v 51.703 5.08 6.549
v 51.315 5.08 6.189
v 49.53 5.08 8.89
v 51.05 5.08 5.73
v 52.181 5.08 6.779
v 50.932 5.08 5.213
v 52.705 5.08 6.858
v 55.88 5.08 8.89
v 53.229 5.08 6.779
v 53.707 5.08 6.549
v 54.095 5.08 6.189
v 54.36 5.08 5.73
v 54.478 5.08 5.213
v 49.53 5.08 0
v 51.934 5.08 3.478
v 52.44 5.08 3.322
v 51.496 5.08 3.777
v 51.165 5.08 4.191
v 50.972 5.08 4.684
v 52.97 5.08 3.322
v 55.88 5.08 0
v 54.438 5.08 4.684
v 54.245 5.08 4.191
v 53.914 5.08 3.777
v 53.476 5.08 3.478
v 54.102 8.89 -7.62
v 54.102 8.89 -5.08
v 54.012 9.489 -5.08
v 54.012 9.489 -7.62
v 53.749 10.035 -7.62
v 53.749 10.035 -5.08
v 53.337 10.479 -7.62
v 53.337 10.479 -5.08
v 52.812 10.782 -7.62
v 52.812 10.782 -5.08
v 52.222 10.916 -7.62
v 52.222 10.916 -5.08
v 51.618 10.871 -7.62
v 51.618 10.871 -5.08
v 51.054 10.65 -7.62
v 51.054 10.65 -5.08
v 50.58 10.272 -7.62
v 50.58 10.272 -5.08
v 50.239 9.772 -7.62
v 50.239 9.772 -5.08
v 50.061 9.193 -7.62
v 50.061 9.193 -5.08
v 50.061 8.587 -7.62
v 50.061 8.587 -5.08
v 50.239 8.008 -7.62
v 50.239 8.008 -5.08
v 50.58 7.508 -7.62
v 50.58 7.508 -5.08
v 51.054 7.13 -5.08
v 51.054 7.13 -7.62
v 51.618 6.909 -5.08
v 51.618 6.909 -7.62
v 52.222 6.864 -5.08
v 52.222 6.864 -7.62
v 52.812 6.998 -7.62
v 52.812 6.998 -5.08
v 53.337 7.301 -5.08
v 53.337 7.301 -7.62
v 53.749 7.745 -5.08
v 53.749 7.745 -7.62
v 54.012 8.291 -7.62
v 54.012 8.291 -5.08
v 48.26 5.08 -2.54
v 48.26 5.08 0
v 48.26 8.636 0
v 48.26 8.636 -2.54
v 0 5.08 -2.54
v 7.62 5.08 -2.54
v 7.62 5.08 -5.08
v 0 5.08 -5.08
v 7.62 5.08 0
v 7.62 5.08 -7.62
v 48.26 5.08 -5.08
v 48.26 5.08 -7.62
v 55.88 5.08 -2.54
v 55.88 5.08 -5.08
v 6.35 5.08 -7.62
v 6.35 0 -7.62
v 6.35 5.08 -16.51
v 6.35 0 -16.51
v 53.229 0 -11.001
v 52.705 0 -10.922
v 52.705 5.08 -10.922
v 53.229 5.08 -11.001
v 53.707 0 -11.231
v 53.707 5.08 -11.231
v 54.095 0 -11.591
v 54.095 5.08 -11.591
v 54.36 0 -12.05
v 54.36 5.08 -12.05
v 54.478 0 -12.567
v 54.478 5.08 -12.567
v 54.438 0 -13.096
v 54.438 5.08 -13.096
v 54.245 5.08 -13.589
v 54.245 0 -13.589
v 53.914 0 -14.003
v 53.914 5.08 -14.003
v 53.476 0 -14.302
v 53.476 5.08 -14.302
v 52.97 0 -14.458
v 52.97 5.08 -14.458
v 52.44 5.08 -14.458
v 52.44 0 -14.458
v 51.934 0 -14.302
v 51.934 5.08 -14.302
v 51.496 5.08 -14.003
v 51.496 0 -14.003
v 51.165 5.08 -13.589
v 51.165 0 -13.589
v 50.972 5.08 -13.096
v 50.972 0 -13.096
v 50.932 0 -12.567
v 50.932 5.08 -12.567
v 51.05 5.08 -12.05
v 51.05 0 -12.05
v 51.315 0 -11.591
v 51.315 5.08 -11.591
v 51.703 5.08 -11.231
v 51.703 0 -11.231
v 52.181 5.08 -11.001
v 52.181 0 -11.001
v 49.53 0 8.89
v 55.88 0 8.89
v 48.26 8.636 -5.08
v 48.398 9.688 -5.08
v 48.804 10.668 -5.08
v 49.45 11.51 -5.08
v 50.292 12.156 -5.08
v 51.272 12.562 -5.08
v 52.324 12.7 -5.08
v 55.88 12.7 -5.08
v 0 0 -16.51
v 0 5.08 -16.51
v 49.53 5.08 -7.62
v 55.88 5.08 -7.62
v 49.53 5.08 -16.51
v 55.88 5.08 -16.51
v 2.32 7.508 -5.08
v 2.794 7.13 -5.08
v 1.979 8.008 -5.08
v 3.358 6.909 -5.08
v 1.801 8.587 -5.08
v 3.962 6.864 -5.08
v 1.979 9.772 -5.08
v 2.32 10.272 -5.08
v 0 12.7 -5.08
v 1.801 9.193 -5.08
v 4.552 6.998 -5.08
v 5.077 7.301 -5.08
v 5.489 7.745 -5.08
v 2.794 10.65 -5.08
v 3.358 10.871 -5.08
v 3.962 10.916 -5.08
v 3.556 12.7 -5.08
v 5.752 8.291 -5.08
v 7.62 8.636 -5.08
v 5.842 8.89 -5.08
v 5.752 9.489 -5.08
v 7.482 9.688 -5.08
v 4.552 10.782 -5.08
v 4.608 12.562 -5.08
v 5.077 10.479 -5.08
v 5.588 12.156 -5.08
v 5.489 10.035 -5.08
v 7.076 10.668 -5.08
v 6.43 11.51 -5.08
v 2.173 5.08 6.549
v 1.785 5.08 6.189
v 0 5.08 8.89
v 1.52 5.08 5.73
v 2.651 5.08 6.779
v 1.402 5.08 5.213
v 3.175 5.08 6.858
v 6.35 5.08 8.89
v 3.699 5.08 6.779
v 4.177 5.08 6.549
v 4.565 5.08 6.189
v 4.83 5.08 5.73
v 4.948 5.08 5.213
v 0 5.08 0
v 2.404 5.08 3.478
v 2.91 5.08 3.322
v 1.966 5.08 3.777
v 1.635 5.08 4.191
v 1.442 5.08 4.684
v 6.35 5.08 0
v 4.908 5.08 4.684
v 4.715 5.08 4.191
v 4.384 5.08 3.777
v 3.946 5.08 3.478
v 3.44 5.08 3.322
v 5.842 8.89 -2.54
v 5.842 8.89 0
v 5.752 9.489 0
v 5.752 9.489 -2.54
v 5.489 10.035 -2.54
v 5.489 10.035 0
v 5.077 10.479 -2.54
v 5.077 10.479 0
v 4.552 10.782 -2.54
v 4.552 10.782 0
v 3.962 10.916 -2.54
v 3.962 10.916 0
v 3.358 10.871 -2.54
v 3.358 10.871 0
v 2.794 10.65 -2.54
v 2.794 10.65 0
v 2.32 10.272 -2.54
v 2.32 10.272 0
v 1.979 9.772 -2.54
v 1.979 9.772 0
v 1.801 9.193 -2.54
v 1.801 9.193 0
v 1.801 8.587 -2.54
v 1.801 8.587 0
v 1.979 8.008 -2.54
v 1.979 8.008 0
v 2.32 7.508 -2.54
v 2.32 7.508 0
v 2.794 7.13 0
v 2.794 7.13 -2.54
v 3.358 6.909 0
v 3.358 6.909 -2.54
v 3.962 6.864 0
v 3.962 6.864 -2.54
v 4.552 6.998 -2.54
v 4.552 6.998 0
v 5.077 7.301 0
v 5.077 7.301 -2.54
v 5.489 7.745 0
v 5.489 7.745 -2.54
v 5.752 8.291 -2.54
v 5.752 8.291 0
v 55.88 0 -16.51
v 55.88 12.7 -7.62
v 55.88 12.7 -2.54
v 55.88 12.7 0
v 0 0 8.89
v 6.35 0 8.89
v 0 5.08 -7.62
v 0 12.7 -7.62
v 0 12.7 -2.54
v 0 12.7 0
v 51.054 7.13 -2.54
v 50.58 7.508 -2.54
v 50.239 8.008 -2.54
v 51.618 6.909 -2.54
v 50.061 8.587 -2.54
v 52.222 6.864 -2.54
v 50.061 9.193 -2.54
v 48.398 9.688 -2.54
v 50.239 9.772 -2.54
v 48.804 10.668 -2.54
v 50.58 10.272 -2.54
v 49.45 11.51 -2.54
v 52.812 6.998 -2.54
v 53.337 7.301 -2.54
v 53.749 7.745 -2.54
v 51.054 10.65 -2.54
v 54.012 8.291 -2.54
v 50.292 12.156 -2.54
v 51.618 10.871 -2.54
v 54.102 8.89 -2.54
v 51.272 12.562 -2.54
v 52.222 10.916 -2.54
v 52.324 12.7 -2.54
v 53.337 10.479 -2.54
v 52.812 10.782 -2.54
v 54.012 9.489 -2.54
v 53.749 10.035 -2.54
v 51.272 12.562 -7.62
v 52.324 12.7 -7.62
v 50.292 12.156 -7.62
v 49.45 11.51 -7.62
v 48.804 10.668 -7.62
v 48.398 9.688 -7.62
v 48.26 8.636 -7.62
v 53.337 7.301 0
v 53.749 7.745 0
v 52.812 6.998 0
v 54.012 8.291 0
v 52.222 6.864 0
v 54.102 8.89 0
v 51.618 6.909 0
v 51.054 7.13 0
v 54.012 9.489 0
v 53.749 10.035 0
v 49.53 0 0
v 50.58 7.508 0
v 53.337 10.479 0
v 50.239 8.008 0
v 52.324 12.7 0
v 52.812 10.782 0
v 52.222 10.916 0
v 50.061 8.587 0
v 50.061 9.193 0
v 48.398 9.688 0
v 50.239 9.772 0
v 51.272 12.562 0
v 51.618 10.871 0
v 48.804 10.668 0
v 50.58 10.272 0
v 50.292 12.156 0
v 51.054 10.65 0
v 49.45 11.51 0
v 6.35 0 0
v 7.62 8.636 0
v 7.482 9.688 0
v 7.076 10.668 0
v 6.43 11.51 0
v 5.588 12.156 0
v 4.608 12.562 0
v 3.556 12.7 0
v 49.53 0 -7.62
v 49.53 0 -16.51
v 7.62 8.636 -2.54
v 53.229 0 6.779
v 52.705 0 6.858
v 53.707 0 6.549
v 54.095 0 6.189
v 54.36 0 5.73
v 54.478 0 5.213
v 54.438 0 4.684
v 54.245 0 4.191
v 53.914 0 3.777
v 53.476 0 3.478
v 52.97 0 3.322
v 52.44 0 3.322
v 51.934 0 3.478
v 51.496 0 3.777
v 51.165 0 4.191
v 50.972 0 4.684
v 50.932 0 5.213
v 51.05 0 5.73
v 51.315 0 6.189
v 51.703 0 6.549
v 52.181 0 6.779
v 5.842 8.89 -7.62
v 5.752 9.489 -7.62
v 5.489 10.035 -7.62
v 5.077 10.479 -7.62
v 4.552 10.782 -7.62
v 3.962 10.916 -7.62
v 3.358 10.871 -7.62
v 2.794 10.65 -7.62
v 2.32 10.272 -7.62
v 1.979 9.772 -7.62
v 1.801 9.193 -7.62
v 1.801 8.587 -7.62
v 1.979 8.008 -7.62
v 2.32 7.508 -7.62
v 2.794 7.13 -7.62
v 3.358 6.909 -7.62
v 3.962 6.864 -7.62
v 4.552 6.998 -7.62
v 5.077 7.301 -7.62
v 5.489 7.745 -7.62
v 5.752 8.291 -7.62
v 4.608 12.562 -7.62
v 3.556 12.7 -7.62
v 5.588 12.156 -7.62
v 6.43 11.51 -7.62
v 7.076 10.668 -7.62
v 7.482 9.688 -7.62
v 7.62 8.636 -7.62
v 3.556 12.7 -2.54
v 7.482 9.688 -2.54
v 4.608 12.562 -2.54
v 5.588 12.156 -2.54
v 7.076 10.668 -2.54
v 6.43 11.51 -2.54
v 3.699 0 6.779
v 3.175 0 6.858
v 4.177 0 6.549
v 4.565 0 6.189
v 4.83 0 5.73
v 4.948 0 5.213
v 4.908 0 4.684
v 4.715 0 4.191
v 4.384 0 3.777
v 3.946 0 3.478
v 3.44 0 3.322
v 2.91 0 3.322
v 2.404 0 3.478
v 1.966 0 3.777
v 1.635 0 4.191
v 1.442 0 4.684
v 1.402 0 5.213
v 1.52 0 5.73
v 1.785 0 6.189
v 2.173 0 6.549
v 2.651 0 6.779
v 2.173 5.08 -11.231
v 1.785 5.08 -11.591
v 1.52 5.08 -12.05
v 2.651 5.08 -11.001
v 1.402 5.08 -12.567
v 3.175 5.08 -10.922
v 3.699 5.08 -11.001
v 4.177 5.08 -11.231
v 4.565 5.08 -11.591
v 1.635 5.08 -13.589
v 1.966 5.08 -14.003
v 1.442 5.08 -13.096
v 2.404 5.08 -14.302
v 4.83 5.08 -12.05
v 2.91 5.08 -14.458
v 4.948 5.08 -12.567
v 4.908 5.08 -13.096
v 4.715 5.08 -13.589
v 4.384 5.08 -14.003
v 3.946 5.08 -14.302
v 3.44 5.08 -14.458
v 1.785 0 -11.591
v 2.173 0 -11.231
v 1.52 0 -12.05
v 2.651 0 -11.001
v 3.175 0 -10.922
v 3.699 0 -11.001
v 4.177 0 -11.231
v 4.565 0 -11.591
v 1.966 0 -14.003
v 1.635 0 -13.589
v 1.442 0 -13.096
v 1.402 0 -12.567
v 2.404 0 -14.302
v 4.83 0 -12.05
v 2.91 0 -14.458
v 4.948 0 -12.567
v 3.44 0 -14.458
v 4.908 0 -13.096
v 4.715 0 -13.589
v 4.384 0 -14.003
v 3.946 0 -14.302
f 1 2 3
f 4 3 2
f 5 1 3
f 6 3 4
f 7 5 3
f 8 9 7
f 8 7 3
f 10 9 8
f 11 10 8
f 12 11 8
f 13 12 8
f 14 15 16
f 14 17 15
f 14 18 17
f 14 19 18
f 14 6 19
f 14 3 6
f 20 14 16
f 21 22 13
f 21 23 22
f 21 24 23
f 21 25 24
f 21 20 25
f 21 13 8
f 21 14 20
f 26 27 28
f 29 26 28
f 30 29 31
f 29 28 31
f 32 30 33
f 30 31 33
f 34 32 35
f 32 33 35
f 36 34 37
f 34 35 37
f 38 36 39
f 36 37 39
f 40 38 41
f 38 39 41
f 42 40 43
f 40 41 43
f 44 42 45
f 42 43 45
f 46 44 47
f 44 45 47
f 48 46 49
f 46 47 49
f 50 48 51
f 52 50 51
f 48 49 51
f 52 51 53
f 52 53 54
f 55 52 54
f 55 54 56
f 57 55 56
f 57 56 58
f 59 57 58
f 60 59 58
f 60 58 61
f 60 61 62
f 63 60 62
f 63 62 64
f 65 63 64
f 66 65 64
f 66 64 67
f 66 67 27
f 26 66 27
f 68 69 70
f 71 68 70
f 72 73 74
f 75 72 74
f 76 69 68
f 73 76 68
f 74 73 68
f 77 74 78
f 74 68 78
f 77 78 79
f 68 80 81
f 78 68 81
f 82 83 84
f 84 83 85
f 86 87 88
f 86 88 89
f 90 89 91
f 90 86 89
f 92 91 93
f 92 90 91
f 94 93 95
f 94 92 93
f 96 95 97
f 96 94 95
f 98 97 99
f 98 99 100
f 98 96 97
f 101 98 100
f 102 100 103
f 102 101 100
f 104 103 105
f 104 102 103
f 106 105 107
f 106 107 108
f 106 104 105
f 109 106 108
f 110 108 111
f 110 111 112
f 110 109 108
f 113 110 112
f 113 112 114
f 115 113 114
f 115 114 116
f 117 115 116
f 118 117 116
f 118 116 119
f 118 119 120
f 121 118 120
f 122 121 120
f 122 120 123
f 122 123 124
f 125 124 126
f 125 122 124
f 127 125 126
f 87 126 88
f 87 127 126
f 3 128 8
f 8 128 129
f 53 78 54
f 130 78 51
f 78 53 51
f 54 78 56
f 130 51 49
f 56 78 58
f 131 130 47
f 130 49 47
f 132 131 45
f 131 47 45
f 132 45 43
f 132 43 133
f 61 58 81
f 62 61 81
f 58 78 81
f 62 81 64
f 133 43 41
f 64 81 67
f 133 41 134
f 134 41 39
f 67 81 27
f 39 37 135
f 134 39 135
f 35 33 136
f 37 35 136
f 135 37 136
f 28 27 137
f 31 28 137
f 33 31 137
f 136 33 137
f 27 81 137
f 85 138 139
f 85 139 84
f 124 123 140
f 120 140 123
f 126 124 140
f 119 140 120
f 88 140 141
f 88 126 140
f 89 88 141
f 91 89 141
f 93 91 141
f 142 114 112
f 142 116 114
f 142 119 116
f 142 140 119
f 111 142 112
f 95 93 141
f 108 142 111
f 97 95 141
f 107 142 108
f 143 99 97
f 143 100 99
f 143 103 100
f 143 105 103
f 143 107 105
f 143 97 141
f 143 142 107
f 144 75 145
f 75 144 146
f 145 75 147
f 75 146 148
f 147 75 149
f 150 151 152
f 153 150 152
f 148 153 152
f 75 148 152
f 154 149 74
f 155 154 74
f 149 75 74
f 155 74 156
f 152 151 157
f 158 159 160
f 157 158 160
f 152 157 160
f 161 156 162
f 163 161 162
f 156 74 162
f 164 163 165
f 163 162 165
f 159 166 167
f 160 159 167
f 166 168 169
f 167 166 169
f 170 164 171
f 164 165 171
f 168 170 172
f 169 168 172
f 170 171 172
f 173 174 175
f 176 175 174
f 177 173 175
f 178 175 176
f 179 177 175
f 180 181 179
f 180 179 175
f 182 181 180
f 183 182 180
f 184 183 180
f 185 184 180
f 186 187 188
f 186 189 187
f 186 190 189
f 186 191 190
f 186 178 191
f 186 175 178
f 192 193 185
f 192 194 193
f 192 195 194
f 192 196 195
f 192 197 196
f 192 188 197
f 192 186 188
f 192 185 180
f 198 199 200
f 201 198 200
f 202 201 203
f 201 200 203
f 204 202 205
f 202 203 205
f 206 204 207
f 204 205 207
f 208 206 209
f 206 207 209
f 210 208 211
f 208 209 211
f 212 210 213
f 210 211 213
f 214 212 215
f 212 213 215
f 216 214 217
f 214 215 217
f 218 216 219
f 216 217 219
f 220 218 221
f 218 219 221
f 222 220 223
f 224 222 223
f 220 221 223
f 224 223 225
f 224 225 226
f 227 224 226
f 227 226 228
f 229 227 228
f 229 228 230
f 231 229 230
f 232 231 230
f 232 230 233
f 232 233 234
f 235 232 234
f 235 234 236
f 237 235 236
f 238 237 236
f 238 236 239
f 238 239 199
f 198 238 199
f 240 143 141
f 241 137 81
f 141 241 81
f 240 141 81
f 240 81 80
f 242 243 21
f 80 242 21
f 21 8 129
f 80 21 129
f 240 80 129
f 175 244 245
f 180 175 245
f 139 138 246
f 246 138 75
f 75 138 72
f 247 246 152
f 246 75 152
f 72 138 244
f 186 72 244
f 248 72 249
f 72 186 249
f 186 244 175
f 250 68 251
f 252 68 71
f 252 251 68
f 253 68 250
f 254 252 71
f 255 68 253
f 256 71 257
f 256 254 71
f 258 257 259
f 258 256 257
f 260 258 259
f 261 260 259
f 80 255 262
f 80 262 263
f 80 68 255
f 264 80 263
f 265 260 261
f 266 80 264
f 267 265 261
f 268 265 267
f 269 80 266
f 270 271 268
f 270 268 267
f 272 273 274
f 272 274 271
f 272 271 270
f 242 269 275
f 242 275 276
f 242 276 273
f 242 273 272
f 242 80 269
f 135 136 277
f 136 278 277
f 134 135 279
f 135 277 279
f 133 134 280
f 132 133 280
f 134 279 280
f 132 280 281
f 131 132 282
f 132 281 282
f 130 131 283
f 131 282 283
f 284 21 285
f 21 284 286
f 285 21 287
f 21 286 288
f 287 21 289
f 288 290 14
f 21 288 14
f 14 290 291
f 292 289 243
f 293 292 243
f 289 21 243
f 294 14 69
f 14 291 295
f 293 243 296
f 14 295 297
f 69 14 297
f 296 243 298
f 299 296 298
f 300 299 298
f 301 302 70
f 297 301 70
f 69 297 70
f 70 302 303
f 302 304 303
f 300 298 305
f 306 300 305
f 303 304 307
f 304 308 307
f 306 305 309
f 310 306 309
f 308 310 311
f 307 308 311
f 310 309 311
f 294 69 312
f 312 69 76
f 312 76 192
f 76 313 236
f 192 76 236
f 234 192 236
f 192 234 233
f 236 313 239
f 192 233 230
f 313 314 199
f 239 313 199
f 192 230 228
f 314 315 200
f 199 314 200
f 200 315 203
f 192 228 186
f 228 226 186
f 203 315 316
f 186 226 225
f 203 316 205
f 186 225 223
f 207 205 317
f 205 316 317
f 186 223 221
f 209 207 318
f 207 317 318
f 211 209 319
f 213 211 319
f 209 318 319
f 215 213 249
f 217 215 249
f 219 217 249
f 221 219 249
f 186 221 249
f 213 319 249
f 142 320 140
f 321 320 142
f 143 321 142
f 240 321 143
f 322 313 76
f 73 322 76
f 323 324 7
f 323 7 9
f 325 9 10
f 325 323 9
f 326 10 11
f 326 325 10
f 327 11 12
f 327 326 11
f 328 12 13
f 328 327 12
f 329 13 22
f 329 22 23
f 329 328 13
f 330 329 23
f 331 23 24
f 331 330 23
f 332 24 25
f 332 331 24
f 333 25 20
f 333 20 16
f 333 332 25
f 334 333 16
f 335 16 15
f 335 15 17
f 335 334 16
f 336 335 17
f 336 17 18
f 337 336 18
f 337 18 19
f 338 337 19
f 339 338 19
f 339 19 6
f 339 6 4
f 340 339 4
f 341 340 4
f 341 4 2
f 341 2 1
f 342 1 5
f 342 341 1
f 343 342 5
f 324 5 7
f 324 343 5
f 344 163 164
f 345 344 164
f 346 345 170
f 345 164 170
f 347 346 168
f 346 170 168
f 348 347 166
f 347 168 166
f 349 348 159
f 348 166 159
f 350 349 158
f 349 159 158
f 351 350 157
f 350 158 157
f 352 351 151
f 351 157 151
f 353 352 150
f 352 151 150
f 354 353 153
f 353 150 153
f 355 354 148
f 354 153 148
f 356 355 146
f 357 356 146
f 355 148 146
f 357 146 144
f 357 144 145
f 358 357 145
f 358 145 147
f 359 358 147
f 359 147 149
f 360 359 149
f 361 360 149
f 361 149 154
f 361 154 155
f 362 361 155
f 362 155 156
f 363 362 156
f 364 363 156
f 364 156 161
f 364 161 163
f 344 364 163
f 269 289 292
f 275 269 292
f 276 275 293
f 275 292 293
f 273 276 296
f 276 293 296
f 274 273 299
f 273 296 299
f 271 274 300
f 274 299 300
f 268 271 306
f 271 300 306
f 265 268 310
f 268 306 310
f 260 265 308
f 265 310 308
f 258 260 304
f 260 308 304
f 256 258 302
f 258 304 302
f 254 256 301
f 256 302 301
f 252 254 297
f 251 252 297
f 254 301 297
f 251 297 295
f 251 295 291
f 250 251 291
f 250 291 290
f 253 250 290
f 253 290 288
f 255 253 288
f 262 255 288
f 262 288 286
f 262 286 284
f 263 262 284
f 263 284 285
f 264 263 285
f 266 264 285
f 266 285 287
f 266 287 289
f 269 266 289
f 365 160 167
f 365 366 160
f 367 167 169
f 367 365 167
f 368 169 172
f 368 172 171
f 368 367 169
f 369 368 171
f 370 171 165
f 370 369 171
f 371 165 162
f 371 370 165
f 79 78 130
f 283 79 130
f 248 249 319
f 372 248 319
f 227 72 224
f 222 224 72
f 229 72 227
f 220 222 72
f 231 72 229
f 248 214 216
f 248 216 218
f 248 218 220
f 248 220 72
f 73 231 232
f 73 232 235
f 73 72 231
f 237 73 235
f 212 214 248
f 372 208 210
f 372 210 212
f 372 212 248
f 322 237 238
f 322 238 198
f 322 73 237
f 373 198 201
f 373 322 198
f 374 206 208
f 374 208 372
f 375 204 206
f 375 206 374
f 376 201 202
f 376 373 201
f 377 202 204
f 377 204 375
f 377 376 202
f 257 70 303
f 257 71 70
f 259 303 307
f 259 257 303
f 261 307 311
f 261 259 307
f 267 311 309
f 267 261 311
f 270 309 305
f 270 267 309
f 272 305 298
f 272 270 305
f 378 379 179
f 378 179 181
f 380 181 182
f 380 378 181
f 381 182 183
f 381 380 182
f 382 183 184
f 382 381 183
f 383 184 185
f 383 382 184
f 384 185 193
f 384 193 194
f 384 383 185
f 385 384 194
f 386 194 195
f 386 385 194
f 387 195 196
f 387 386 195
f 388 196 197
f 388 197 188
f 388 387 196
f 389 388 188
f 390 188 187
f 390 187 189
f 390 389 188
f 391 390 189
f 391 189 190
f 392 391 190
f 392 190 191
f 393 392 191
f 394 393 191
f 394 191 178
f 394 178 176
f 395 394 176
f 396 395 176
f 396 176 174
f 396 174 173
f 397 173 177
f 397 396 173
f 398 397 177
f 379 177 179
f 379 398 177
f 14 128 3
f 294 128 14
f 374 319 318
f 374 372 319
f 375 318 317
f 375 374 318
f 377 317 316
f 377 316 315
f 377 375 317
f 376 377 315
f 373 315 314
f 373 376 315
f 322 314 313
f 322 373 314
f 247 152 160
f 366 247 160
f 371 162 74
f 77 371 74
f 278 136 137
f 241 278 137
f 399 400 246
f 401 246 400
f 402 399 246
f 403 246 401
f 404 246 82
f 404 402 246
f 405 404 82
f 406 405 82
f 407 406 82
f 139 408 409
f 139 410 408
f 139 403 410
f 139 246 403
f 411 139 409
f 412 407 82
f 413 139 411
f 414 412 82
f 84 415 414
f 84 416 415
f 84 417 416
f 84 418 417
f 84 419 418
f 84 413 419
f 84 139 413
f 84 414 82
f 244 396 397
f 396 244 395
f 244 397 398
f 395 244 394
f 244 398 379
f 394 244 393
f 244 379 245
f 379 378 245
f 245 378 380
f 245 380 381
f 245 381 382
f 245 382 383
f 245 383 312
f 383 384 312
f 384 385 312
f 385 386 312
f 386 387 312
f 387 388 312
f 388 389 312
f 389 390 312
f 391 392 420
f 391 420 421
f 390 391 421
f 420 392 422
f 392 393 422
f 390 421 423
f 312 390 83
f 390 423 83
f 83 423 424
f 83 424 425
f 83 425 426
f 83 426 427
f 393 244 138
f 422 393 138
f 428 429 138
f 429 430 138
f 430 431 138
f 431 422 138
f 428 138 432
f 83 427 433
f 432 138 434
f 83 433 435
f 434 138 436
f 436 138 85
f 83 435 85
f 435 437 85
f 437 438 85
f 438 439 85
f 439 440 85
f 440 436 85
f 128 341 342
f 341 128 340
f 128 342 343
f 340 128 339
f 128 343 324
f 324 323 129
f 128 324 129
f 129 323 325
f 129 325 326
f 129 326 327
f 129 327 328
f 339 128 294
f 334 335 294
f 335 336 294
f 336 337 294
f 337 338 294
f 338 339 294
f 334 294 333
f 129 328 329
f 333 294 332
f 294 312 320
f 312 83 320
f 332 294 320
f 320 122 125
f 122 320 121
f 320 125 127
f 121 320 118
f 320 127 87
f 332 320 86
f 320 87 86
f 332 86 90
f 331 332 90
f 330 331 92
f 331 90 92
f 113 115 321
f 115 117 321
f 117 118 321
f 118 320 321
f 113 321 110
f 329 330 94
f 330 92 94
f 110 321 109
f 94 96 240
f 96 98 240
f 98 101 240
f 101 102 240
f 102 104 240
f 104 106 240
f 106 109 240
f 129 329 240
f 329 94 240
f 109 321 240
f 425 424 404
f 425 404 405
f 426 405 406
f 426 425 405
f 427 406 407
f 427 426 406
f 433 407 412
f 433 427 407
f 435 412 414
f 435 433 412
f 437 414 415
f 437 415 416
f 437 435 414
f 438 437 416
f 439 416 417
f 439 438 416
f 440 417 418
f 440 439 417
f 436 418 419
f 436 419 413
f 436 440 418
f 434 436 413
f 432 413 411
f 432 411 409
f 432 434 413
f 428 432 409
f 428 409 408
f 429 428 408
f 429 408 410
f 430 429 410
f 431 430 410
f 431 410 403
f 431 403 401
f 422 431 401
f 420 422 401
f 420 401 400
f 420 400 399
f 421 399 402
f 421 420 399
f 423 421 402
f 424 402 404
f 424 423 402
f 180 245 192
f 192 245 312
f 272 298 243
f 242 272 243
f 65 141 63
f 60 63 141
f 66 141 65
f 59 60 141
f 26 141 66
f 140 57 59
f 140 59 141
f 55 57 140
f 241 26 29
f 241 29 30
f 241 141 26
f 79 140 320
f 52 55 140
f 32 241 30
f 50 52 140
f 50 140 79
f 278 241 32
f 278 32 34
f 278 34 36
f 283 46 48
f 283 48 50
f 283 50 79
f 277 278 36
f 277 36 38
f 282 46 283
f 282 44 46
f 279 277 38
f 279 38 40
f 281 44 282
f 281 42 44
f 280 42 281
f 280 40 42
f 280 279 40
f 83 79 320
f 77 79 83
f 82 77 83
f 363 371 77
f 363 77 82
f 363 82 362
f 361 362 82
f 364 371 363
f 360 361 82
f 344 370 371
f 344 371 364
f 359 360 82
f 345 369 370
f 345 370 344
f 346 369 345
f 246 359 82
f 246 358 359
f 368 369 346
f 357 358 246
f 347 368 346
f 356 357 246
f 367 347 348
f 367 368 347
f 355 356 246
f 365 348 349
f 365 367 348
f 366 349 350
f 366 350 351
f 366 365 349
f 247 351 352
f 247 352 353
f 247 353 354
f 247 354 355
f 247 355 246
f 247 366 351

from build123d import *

# Parameters (mm, degrees)
SKETCH1_R           = 2.032
BOSS_EXTRUDE1_DEPTH = 7.62
SKETCH3_W           = 2.54
SKETCH3_H           = 7.62
CUT_EXTRUDE1_DEPTH  = 55.88
SKETCH5_W           = 6.35
SKETCH5_H           = 8.89
SKETCH5_R           = 1.778
BOSS_EXTRUDE2_DEPTH = 5.08
FILLET2_R           = 4.064


with BuildPart() as part:
    # Sketch1 → Boss-Extrude1 (new body)
    with BuildSketch(Plane.XY):
        Polygon((0, 0), (0, 12.7), (7.62, 12.7), (7.62, 5.08), (48.26, 5.08), (48.26, 12.7), (55.88, 12.7), (55.88, 0), align=None)
        with Locations((3.81, 8.89)):
            Circle(SKETCH1_R, mode=Mode.SUBTRACT)
        with Locations((52.07, 8.89)):
            Circle(SKETCH1_R, mode=Mode.SUBTRACT)
    extrude(amount=-BOSS_EXTRUDE1_DEPTH)

    # Sketch3 → Cut-Extrude1 (cut)
    with BuildSketch(Plane(origin=(55.88, 0, 0), x_dir=(0, 0, -1), z_dir=(1, 0, 0))):
        with Locations((3.81, 8.89)):
            Rectangle(SKETCH3_W, SKETCH3_H)
    extrude(amount=-CUT_EXTRUDE1_DEPTH, mode=Mode.SUBTRACT)

    # Sketch5 → Boss-Extrude2 (add)
    # profile 1 of 4: a face of its own
    with BuildSketch(Plane(origin=(0, 0, 0), x_dir=(1, 0, 0), z_dir=(0, 1, 0))):
        with Locations((52.705, 12.065)):
            Rectangle(SKETCH5_W, SKETCH5_H)
        with Locations(Location((52.705, 12.7, 0), (0, 0, 270))):
            Circle(SKETCH5_R, mode=Mode.SUBTRACT)
    # profile 2 of 4: a face of its own
    with BuildSketch(Plane(origin=(0, 0, 0), x_dir=(1, 0, 0), z_dir=(0, 1, 0))):
        with Locations((52.705, -4.445)):
            Rectangle(SKETCH5_W, SKETCH5_H)
        with Locations(Location((52.705, -5.08, 0), (0, 0, 270))):
            Circle(SKETCH5_R, mode=Mode.SUBTRACT)
    # profile 3 of 4: a face of its own
    with BuildSketch(Plane(origin=(0, 0, 0), x_dir=(1, 0, 0), z_dir=(0, 1, 0))):
        with Locations((3.175, -4.445)):
            Rectangle(SKETCH5_W, SKETCH5_H)
        with Locations(Location((3.175, -5.08, 0), (0, 0, 270))):
            Circle(SKETCH5_R, mode=Mode.SUBTRACT)
    # profile 4 of 4: a face of its own
    with BuildSketch(Plane(origin=(0, 0, 0), x_dir=(1, 0, 0), z_dir=(0, 1, 0))):
        with Locations((3.175, 12.065)):
            Rectangle(SKETCH5_W, SKETCH5_H)
        with Locations(Location((3.175, 12.7, 0), (0, 0, 270))):
            Circle(SKETCH5_R, mode=Mode.SUBTRACT)
    extrude(amount=BOSS_EXTRUDE2_DEPTH)

    # Fillet2
    fillet2_edges = [part.edges().sort_by_distance(p)[0] for p in [
        (7.62, 12.7, -6.35),
        (48.26, 12.7, -6.35),
        (48.26, 12.7, -1.27),
        (7.62, 12.7, -1.27),
    ]]
    fillet(fillet2_edges, radius=FILLET2_R)


solid = part.part
